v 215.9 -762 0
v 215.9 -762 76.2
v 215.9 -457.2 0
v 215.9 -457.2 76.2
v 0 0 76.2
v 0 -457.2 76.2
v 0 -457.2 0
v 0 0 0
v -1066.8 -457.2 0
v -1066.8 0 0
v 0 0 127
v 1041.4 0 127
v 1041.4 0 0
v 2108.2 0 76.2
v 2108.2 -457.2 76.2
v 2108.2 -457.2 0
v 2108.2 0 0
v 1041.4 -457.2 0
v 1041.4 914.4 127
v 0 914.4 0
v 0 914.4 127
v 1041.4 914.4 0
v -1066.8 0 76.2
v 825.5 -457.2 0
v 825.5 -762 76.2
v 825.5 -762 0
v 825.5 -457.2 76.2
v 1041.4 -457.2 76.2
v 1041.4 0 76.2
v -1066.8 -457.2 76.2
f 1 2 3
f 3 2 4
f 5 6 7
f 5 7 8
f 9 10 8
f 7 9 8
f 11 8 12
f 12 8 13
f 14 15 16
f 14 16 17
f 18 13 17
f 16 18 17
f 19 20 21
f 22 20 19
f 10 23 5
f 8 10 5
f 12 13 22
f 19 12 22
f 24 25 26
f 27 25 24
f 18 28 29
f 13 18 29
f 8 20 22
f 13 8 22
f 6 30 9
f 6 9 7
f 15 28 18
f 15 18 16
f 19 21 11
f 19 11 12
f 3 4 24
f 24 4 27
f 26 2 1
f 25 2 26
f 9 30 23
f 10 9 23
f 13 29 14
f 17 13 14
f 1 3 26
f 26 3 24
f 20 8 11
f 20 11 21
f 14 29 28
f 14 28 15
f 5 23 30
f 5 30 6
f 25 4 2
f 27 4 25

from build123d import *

# Parameters (mm, degrees)
F0_W     = 1041.4
F0_H     = 914.4
F1_DEPTH = 127
F3_START = -50.8
F2_W     = 1066.8
F2_H     = 457.2
F3_DEPTH = 76.2
F5_START = -50.8
F4_W     = 609.6
F4_H     = 304.8
F5_DEPTH = 76.2


with BuildPart() as f1:
    # F0 (on Top) → F1 (new body)
    with BuildSketch(Plane.XY):
        with Locations((520.7, 457.2)):
            Rectangle(F0_W, F0_H)
    extrude(amount=F1_DEPTH)


with BuildPart() as f3:
    # F2 (on face) → F3 (new body)
    with BuildSketch(Plane.XY.offset(127).offset(F3_START)):
        with Locations((-533.4, -228.6)):
            Rectangle(F2_W, F2_H)
    extrude(amount=-F3_DEPTH)


with BuildPart() as f3b:
    # F2 (on face) → F3, piece 2 (new body)
    with BuildSketch(Plane.XY.offset(127).offset(F3_START)):
        with Locations((1574.8, -228.6)):
            Rectangle(F2_W, F2_H)
    extrude(amount=-F3_DEPTH)


with BuildPart() as f5:
    # F4 (on face) → F5 (new body)
    with BuildSketch(Plane.XY.offset(127).offset(F5_START)):
        with Locations((520.7, -609.6)):
            Rectangle(F4_W, F4_H)
    extrude(amount=-F5_DEPTH)


solid = Compound([f1.part, f3.part, f3b.part, f5.part])
